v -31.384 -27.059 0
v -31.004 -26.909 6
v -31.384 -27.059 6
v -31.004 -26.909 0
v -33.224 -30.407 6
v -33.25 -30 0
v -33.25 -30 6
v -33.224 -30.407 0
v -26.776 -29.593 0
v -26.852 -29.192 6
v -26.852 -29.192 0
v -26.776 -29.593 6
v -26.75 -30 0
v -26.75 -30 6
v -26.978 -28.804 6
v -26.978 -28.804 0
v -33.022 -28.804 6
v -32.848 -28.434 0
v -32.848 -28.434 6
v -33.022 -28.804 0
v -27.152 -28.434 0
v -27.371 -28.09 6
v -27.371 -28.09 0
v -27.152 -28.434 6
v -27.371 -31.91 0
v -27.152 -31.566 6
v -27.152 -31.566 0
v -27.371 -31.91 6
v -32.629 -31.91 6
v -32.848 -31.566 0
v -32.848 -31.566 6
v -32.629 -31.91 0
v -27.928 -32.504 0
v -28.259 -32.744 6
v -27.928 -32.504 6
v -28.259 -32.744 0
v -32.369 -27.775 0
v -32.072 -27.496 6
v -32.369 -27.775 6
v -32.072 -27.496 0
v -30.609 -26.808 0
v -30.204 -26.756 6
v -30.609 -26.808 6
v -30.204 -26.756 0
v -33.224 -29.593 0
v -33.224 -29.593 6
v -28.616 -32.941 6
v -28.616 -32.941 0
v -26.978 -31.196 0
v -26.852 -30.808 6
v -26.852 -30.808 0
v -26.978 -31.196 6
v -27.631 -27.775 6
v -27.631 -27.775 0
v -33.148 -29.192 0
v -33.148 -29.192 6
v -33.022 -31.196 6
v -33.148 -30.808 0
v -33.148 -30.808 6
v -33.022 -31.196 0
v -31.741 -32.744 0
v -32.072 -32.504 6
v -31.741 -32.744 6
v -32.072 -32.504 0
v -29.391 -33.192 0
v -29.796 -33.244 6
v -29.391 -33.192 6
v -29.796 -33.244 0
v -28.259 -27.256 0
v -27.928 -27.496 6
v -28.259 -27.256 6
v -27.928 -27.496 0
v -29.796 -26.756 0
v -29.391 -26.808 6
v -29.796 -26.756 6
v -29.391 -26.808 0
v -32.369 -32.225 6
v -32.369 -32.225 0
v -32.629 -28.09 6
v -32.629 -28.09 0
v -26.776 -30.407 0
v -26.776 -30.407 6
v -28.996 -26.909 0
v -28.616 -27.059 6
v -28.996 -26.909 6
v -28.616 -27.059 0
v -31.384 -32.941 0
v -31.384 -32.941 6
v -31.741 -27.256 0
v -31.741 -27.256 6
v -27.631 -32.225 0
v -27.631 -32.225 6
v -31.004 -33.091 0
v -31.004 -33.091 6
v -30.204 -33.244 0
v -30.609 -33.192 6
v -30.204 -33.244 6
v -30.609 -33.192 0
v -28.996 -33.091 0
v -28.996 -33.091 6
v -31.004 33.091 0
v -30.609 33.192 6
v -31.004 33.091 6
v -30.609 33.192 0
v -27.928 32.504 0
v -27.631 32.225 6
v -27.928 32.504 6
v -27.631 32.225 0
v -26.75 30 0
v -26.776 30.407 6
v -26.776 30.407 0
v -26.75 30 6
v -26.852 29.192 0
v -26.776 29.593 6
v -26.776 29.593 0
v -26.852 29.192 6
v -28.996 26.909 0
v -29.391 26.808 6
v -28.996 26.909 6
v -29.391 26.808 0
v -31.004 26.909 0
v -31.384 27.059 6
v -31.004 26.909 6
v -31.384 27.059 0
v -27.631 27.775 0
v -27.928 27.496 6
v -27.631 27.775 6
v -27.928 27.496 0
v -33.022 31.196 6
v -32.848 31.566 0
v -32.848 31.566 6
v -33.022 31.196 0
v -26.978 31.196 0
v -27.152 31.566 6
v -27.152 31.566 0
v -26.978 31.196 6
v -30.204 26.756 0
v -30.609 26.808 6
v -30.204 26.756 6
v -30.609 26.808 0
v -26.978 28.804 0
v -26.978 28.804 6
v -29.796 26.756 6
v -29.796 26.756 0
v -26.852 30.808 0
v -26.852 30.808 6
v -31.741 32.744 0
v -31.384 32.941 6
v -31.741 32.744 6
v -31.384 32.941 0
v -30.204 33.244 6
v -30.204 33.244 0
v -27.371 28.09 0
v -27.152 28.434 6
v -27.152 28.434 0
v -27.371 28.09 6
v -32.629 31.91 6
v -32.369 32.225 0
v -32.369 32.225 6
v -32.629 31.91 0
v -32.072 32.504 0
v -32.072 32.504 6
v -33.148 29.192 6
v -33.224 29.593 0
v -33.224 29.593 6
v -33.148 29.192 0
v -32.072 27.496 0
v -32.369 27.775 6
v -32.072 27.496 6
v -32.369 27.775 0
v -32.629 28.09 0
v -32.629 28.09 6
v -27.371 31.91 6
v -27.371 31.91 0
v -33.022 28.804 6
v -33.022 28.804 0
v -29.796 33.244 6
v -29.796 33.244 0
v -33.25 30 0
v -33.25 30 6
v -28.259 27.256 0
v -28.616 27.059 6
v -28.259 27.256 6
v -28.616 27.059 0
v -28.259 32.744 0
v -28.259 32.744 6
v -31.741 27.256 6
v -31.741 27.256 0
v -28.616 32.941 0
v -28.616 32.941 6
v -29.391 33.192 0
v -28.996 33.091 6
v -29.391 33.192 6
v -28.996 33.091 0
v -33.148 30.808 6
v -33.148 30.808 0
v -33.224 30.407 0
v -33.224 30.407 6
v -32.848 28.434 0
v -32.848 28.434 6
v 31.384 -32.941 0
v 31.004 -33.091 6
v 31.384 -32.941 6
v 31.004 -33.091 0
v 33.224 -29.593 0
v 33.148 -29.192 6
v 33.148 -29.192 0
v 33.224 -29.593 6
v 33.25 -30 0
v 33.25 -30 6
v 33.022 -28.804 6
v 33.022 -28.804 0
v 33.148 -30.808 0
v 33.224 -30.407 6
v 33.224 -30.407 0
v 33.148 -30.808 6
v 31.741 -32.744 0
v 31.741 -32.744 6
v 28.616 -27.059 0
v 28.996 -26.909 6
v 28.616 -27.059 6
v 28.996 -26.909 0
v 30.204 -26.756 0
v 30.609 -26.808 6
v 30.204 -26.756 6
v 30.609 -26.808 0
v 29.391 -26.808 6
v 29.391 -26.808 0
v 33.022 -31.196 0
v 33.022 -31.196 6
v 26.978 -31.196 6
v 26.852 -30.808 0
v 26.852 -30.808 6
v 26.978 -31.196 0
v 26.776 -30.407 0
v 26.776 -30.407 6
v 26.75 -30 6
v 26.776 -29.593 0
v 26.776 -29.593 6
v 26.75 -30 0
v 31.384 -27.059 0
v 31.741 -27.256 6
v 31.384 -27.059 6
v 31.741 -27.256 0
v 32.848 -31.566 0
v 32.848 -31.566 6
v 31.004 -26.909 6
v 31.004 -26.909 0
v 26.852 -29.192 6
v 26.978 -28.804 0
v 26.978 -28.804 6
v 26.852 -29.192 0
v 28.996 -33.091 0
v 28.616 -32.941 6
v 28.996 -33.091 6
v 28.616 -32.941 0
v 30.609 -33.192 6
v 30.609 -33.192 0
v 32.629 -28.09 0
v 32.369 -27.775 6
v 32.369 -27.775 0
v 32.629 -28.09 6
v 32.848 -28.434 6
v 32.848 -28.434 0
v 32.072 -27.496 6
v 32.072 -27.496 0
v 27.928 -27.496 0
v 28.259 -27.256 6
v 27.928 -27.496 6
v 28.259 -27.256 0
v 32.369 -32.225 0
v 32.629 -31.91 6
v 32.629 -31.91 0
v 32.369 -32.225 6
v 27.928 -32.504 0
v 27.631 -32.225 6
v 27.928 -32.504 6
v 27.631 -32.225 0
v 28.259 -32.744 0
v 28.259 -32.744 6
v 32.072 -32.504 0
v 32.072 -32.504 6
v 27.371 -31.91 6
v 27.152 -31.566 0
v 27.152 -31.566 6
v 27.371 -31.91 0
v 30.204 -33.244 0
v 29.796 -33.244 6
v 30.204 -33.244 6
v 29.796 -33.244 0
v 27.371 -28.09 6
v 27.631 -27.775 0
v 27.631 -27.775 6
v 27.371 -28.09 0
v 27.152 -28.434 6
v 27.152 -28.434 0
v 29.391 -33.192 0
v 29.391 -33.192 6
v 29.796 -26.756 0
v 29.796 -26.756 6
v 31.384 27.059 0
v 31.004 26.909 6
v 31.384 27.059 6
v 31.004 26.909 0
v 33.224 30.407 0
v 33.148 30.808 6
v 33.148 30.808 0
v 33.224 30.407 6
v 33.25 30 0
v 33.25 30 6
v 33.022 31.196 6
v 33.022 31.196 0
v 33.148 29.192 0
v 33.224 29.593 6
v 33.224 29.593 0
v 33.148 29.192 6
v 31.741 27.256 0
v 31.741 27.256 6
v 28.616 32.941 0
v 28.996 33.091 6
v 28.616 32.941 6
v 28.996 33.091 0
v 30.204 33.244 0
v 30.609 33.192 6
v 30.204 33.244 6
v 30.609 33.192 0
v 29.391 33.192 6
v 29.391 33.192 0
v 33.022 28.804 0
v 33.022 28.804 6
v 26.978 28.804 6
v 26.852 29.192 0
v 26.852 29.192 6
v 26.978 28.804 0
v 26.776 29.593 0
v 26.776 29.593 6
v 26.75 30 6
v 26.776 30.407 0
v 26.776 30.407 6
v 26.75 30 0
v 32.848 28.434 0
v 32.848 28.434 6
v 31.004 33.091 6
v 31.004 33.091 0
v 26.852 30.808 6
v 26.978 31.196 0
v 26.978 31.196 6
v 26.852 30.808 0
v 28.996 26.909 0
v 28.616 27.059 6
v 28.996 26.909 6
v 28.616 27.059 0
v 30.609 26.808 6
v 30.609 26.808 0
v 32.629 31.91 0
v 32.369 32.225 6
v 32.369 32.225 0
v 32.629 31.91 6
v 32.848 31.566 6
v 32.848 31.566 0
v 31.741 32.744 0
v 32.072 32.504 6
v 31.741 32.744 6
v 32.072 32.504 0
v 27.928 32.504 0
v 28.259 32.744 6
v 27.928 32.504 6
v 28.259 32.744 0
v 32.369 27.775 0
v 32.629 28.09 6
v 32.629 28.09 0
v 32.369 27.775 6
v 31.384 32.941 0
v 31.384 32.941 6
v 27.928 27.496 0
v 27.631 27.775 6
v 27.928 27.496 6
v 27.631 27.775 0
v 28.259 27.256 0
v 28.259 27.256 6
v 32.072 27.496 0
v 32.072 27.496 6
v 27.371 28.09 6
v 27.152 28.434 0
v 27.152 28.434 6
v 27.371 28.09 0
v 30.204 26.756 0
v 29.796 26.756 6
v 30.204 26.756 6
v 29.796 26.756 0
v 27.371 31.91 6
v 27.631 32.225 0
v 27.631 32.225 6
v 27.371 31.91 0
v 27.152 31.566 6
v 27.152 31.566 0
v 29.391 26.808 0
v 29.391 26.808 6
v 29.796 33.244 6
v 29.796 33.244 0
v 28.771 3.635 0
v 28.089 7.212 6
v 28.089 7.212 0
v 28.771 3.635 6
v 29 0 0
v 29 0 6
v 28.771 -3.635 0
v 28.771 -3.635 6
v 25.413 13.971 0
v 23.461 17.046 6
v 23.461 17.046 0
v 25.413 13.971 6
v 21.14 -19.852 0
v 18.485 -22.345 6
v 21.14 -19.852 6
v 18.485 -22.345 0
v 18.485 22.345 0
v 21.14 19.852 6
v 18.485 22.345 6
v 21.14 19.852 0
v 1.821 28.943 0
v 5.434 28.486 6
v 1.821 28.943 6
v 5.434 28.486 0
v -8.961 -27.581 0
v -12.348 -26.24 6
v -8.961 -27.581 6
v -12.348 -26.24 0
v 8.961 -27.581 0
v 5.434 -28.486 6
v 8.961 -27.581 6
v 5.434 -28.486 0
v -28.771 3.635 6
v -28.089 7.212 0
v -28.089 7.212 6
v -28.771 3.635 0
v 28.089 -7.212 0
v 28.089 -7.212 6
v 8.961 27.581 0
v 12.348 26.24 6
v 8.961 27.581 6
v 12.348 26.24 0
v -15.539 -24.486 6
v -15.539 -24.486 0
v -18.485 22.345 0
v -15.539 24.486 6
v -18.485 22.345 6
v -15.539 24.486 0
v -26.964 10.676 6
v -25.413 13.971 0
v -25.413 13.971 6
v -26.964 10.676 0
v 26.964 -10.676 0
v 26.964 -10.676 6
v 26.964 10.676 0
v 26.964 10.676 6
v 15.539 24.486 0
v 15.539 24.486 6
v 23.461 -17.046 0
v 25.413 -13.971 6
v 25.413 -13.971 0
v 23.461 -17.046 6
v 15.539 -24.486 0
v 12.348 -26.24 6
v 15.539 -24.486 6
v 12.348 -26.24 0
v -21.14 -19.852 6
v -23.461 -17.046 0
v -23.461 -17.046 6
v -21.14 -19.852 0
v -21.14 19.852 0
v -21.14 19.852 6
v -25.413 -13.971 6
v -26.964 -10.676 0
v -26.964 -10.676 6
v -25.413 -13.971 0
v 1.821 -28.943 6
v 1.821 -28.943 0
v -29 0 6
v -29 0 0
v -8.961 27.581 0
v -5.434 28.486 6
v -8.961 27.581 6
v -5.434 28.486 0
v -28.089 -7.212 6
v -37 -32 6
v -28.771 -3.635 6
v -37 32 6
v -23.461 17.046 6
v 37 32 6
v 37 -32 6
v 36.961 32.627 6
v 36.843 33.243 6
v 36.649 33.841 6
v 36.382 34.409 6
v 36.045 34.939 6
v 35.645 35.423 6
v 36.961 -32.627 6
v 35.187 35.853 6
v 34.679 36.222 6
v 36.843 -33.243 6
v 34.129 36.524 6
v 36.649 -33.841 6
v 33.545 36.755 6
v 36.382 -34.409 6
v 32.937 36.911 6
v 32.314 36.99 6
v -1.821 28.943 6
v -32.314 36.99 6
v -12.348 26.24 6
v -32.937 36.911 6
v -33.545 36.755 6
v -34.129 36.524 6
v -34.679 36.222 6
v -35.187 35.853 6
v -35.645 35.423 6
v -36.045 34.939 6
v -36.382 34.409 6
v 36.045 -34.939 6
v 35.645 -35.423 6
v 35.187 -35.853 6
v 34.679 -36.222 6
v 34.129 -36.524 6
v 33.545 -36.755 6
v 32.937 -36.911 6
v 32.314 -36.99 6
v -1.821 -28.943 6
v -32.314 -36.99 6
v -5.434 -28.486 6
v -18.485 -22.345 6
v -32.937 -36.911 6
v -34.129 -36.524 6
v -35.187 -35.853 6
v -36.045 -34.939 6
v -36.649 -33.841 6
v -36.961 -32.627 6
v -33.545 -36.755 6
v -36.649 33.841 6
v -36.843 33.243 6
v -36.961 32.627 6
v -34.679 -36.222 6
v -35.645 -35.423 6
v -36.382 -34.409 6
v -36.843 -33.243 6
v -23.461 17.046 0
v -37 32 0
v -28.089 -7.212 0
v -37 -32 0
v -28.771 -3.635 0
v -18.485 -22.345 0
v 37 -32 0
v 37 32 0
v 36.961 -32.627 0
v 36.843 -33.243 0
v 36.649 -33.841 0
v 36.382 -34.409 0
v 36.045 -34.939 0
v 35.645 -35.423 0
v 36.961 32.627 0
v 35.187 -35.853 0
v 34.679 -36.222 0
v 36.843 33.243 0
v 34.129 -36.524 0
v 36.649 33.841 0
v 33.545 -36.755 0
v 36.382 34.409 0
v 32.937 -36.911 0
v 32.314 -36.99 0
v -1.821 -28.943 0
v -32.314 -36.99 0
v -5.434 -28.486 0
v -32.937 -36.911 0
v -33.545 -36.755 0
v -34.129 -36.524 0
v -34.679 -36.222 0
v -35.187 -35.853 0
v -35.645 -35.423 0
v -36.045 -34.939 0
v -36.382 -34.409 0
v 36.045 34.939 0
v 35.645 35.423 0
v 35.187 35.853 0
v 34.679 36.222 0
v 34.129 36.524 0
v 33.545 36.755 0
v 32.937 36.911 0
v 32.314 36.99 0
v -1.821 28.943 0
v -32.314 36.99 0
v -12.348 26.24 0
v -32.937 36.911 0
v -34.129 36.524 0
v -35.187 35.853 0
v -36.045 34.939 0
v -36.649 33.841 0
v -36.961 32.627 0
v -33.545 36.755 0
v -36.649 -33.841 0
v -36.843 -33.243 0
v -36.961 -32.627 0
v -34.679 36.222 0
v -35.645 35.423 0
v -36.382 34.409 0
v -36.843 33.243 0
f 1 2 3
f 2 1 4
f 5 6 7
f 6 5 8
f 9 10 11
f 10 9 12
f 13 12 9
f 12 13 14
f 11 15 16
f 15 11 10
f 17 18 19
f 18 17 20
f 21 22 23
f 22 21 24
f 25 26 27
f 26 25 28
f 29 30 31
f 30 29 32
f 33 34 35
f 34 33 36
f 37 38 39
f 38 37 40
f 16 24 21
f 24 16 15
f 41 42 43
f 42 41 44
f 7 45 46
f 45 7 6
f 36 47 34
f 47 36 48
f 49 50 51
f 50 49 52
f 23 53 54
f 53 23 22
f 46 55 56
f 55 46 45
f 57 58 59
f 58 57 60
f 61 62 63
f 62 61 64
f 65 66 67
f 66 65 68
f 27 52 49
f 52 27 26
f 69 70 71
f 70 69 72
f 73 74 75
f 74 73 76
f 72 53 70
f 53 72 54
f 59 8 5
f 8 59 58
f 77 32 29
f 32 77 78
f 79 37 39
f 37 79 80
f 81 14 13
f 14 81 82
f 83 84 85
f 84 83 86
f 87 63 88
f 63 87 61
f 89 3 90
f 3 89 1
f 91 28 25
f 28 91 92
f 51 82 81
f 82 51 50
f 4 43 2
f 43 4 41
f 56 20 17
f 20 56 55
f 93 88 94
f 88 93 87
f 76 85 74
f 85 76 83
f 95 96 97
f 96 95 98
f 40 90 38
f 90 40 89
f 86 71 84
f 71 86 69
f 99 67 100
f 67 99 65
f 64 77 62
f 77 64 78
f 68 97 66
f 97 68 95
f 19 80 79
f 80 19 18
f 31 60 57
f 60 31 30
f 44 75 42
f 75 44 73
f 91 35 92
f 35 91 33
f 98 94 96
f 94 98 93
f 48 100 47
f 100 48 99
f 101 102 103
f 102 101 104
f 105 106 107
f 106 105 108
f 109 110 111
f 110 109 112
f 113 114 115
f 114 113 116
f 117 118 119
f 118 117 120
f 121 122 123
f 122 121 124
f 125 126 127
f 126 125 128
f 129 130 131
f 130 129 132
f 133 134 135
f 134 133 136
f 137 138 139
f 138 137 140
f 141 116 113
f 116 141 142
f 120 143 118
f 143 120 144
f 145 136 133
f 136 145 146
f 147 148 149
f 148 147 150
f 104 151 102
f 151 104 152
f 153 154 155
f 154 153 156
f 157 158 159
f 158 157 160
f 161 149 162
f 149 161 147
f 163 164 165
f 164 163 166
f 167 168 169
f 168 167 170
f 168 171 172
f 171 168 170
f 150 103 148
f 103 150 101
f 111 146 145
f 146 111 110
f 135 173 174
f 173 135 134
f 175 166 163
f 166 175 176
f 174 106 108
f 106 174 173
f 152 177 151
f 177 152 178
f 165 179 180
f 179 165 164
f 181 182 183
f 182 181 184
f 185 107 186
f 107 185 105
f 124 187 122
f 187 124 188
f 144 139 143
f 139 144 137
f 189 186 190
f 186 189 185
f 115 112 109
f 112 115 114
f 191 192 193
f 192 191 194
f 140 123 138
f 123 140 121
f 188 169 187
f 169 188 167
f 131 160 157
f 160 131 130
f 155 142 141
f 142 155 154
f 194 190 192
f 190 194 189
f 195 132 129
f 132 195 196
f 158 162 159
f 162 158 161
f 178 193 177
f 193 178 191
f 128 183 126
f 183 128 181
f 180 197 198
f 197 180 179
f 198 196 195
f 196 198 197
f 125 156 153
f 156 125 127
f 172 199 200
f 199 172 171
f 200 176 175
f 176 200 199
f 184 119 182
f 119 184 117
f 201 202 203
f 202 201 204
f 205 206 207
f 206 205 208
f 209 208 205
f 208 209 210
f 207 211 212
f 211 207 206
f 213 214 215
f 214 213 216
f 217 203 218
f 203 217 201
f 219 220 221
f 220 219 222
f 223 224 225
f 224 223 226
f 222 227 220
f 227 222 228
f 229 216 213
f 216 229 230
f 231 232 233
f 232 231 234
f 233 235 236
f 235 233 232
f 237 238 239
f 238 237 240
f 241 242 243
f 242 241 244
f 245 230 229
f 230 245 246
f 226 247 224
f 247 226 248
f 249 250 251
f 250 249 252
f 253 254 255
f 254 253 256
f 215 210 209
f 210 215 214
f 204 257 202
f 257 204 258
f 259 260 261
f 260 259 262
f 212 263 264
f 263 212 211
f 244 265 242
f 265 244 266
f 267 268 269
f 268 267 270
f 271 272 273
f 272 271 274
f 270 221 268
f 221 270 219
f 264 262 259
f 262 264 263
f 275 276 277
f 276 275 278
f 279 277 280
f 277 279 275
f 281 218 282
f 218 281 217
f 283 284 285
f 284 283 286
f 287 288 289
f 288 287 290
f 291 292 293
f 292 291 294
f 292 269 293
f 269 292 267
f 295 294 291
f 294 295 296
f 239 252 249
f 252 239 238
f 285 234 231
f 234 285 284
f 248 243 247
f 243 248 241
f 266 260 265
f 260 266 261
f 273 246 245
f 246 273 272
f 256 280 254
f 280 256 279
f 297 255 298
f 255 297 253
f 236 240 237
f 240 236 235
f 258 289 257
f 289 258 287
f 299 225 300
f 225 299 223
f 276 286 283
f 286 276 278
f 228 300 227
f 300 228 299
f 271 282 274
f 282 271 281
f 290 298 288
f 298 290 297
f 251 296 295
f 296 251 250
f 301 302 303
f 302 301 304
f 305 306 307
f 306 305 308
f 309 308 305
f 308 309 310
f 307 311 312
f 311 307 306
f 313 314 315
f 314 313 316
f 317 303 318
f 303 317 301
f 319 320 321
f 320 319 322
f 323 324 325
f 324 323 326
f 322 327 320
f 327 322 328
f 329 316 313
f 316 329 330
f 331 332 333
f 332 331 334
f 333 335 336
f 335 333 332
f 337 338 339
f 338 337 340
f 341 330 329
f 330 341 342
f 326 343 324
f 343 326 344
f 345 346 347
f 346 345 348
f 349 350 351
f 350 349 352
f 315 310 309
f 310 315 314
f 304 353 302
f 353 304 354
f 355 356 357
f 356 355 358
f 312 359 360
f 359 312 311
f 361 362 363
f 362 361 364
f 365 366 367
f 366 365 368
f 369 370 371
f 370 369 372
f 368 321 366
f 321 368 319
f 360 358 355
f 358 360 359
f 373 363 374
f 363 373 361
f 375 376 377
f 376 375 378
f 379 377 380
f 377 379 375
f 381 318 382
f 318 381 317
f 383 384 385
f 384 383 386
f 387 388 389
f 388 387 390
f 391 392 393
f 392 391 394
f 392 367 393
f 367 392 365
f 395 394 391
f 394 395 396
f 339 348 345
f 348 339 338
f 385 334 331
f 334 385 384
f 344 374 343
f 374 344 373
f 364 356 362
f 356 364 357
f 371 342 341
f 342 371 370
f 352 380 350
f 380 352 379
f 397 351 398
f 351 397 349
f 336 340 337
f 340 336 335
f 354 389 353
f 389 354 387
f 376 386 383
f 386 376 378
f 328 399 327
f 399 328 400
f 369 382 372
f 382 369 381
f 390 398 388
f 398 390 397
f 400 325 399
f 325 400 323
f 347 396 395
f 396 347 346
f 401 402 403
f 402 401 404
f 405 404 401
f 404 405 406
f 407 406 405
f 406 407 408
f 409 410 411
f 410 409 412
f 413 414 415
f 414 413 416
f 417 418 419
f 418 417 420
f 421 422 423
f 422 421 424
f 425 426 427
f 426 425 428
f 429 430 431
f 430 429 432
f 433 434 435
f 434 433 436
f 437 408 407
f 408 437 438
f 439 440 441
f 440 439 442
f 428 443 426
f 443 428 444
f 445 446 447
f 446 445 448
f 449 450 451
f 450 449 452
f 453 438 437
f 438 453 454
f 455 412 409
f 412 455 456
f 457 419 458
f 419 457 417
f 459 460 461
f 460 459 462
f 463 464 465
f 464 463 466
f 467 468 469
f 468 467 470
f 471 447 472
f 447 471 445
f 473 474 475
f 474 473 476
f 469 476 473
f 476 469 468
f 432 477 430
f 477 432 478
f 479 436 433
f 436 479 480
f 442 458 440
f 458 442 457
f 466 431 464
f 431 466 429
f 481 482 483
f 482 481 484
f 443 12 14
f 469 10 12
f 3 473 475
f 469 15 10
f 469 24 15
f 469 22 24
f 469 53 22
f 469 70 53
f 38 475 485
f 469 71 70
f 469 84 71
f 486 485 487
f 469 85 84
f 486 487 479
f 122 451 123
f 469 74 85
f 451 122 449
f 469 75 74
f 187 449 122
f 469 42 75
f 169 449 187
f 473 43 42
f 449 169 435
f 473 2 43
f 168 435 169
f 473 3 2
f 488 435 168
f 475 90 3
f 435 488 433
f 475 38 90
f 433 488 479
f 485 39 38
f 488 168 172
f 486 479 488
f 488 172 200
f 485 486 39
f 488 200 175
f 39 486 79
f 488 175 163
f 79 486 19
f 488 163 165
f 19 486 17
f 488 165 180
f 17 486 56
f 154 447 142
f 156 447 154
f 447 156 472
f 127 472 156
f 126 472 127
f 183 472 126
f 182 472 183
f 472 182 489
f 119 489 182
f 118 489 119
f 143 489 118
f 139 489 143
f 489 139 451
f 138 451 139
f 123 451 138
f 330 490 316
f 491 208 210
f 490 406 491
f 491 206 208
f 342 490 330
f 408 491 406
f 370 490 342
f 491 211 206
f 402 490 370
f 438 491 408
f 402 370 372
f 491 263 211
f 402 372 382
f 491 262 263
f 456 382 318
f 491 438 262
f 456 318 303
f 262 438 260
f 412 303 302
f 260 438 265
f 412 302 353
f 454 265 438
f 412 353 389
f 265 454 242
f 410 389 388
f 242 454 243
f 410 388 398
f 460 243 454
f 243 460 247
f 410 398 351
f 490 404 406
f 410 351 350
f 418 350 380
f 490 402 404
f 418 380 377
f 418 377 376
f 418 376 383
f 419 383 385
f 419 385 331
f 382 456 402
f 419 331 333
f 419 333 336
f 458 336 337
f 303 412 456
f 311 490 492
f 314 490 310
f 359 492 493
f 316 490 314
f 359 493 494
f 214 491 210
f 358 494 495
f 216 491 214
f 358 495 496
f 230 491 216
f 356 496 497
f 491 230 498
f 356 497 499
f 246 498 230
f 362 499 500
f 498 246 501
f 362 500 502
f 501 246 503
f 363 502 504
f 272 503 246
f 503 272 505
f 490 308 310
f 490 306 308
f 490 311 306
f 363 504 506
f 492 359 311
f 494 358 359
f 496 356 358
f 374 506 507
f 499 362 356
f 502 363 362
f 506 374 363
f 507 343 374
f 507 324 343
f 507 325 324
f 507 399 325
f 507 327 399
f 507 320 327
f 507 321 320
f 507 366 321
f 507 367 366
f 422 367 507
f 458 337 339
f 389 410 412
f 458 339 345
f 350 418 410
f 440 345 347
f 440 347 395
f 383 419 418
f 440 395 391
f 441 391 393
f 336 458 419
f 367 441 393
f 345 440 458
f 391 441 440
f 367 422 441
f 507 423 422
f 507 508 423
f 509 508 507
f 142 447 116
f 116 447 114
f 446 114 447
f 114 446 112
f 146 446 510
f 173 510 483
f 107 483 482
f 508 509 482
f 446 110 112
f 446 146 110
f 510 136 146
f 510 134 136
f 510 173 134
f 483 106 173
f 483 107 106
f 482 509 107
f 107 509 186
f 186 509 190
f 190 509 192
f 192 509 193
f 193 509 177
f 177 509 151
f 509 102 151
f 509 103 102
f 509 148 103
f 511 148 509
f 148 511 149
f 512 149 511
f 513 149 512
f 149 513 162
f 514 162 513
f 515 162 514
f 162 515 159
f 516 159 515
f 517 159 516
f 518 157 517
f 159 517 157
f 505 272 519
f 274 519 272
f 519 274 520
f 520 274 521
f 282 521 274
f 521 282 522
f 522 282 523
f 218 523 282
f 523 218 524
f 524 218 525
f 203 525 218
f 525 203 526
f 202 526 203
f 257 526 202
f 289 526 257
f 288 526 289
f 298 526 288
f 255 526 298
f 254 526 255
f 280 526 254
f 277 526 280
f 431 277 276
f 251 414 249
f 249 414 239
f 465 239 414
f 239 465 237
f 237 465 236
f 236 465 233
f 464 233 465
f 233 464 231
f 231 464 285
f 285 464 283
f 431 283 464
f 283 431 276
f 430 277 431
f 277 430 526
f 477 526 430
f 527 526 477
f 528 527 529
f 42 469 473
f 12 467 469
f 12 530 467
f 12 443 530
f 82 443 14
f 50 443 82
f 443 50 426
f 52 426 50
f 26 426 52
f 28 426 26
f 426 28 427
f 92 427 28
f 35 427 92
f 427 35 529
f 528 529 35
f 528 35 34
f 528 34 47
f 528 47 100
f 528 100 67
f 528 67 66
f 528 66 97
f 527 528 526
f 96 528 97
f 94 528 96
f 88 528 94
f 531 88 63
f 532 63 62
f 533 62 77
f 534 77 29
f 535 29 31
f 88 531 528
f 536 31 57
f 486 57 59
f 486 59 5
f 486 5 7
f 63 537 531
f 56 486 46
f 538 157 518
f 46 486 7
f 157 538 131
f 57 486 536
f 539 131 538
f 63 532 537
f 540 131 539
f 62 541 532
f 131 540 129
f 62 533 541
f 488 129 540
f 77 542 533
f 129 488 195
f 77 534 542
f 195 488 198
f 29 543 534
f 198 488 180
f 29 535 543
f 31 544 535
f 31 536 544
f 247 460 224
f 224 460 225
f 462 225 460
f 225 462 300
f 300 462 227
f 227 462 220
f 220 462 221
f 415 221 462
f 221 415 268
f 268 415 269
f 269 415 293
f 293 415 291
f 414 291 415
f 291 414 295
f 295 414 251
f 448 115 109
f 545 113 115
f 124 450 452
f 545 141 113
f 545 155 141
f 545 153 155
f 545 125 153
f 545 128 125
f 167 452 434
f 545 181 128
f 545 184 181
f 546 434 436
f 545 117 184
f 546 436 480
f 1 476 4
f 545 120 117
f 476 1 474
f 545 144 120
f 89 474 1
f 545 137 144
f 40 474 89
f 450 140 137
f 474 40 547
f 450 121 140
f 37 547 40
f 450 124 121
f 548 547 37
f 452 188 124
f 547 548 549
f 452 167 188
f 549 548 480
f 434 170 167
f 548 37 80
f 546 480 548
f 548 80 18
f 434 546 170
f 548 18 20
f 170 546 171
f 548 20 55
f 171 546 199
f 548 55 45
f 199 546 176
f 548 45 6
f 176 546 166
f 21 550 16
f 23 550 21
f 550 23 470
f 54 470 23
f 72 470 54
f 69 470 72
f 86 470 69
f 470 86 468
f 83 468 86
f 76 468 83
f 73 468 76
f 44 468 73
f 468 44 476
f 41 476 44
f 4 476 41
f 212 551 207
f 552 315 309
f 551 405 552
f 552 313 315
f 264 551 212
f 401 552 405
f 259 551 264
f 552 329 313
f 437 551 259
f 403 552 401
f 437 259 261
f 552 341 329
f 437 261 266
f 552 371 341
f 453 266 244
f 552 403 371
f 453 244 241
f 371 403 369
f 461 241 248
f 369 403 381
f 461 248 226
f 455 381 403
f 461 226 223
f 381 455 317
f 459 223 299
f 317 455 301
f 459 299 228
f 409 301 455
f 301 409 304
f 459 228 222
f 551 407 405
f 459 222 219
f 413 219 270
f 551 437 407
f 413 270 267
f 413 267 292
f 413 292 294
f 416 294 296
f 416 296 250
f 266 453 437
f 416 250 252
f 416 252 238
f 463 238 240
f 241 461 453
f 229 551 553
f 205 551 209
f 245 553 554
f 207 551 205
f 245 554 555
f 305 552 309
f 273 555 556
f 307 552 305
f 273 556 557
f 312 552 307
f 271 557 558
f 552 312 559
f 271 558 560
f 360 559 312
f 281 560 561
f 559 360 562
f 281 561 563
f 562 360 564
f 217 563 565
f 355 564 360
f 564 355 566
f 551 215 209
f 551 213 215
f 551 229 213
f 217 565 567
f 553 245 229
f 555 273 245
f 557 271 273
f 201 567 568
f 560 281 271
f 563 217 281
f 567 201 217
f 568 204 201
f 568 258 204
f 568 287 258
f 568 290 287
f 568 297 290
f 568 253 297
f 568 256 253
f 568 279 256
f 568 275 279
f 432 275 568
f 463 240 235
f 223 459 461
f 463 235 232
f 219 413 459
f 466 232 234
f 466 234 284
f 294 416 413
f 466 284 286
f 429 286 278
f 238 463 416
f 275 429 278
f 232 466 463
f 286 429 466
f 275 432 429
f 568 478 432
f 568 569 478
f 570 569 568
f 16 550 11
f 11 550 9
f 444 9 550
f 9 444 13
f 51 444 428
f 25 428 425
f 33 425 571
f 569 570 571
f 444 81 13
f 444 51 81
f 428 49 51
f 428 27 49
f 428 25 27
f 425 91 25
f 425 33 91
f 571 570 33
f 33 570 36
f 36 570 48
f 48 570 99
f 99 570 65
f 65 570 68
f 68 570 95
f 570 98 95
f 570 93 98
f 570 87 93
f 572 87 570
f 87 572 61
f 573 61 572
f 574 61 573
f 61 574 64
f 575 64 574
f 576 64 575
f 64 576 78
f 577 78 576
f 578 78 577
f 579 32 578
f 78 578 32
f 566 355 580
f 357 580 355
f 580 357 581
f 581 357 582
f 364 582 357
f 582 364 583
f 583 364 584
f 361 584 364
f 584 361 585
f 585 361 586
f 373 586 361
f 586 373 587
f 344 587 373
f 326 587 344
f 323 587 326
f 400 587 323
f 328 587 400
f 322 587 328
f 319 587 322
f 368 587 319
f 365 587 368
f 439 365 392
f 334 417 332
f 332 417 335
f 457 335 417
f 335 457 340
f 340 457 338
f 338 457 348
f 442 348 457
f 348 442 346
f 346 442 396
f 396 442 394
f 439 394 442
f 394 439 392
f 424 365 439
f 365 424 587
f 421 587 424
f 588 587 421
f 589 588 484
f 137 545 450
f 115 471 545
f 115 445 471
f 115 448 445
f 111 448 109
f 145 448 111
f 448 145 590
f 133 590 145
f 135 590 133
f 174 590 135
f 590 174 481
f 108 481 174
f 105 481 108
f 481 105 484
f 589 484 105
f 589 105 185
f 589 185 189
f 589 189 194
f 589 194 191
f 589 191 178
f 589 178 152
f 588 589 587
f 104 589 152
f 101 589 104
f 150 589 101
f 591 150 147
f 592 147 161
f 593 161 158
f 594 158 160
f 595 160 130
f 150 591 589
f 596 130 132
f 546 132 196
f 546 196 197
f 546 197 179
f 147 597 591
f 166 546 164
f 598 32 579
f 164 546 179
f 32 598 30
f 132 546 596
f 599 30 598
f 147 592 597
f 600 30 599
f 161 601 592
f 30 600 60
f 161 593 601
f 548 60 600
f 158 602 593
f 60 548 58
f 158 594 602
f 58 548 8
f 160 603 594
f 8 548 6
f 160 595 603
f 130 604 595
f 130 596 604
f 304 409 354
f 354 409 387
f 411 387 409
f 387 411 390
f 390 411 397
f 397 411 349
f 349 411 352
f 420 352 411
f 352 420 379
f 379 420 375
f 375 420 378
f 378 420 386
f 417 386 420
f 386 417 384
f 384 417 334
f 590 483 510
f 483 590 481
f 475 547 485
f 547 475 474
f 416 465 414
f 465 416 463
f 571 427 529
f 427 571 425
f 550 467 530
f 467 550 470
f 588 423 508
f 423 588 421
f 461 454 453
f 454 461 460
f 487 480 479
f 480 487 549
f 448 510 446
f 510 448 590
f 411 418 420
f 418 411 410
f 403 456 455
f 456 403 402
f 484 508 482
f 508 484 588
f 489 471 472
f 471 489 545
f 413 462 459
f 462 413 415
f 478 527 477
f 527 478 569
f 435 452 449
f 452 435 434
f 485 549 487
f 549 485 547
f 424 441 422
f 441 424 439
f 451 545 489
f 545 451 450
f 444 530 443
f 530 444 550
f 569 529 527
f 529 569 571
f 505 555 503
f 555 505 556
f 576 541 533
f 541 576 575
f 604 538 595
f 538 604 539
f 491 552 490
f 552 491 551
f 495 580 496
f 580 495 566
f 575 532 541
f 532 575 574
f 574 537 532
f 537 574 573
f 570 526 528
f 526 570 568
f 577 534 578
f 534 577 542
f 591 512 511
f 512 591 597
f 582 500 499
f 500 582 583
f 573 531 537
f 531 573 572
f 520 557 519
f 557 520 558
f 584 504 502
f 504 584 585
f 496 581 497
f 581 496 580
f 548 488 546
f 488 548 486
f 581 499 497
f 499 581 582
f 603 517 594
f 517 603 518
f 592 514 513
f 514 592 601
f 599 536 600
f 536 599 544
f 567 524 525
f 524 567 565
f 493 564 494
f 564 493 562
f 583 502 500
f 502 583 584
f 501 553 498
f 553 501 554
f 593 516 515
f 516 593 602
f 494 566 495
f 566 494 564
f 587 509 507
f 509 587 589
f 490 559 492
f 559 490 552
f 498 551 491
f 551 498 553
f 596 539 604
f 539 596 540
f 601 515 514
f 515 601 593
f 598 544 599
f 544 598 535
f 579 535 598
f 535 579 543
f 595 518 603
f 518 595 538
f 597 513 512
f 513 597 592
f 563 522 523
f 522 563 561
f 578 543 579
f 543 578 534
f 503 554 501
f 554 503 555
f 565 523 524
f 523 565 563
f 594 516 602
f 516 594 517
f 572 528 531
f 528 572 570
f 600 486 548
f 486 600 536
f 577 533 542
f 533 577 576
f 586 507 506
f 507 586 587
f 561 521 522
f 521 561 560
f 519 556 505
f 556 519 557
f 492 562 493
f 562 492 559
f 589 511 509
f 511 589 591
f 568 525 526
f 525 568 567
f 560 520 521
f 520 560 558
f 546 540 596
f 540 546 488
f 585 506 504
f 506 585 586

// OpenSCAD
$fn = 50;


difference() {
	union() {
		hull() {
			translate(v = [-32.0000000000, 32.0000000000, 0]) {
				cylinder(h = 6, r = 5);
			}
			translate(v = [32.0000000000, 32.0000000000, 0]) {
				cylinder(h = 6, r = 5);
			}
			translate(v = [-32.0000000000, -32.0000000000, 0]) {
				cylinder(h = 6, r = 5);
			}
			translate(v = [32.0000000000, -32.0000000000, 0]) {
				cylinder(h = 6, r = 5);
			}
		}
	}
	union() {
		#translate(v = [-30.0000000000, -30.0000000000, -100.0000000000]) {
			cylinder(h = 200, r = 3.2500000000);
		}
		#translate(v = [-30.0000000000, 30.0000000000, -100.0000000000]) {
			cylinder(h = 200, r = 3.2500000000);
		}
		#translate(v = [30.0000000000, -30.0000000000, -100.0000000000]) {
			cylinder(h = 200, r = 3.2500000000);
		}
		#translate(v = [30.0000000000, 30.0000000000, -100.0000000000]) {
			cylinder(h = 200, r = 3.2500000000);
		}
		#cylinder(h = 6, r = 29.0000000000);
	}
}
